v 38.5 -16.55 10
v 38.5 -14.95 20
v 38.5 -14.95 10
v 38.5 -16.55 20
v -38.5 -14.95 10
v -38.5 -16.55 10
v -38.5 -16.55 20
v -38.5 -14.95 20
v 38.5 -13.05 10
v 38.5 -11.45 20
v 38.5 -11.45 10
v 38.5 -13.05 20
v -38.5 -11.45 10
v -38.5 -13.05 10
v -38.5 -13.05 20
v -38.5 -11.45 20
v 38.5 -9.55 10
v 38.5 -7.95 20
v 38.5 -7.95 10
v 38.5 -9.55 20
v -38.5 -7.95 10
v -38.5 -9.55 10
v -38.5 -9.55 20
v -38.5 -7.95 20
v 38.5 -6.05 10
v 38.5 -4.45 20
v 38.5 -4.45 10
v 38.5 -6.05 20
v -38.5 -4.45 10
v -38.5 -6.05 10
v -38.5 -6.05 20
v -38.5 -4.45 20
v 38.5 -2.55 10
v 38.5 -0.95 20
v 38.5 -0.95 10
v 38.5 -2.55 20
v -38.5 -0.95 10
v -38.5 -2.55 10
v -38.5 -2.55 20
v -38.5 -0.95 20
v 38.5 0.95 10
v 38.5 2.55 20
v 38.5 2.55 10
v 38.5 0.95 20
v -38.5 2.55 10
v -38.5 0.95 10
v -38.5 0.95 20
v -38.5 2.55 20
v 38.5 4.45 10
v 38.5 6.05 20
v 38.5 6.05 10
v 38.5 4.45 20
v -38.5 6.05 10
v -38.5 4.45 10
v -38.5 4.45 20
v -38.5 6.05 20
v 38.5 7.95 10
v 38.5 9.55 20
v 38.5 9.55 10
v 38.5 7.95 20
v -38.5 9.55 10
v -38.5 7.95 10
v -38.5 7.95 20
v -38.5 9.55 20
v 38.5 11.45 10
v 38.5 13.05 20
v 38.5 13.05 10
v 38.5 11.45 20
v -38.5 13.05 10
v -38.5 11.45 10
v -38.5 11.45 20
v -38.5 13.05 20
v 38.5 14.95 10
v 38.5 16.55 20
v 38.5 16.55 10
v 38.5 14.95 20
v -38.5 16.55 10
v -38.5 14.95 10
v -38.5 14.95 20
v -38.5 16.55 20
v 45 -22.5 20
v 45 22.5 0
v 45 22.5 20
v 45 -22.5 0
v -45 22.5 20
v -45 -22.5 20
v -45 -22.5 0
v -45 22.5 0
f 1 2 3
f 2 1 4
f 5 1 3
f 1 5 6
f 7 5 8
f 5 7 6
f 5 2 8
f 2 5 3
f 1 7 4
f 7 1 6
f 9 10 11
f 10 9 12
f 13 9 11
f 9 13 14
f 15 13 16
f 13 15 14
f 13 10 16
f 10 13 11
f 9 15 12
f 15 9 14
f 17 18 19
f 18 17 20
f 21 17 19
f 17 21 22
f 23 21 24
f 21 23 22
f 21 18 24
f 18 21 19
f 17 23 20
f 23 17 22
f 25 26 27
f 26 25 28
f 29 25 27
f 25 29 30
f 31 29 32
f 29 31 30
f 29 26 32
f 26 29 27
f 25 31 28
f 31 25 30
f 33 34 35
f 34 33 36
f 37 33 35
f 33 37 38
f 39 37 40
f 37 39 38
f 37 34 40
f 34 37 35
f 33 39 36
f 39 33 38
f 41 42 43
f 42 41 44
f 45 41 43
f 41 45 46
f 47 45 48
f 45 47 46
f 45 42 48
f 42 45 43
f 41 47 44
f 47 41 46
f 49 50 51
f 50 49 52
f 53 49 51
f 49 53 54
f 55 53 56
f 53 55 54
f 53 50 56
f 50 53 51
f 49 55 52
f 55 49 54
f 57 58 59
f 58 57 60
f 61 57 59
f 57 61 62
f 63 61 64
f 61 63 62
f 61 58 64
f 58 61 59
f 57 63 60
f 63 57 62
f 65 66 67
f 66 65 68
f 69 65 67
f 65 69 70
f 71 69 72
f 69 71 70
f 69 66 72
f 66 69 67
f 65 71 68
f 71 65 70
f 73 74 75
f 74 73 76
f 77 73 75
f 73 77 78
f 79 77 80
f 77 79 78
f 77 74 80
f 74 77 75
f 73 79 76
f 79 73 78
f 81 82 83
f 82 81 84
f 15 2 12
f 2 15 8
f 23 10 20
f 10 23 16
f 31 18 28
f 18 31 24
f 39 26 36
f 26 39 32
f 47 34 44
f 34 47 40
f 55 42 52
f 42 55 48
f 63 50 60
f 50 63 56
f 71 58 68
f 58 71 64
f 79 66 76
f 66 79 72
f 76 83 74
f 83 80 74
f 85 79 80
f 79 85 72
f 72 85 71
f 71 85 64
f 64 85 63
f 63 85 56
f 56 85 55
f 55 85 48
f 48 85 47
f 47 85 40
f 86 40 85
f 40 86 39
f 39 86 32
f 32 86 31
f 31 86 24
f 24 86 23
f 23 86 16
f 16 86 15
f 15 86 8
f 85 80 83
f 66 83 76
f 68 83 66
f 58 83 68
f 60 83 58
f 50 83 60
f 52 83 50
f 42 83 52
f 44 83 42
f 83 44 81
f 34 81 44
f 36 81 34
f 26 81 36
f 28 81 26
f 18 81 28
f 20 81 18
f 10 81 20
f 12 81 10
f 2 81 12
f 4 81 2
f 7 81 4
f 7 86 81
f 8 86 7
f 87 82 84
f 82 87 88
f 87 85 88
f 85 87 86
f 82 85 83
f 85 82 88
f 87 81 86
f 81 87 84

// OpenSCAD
// Microscope slide drying rack
// Print orientation: base block on XY plane, slots open upward (+Z)

// ---------------- Parameters ----------------
block_len    = 90;    // base block length along X (mm)
block_wid    = 45;    // base block width along Y (mm)
block_h      = 20;    // base block height along Z (mm)

slot_count   = 10;    // number of slide slots
slot_len     = 77;    // slot length along X (mm)
slot_w       = 1.6;   // slot width along Y (mm)
slot_depth   = 10;    // slot depth into block from top face (mm)
slot_pitch   = 3.5;   // centre-to-centre slot spacing along Y (mm)

eps          = 0.5;   // cutter overshoot past top face (mm)

$fn = 64;

// ---------------- Model ----------------
difference() {
    // Base block, centred in X/Y, resting on z = 0
    translate([-block_len/2, -block_wid/2, 0])
        cube([block_len, block_wid, block_h]);

    // Parallel slots running along X, centred as a group in X and Y
    for (i = [0 : slot_count - 1]) {
        y_c = (i - (slot_count - 1)/2) * slot_pitch;
        translate([-slot_len/2, y_c - slot_w/2, block_h - slot_depth])
            cube([slot_len, slot_w, slot_depth + eps]);
    }
}
